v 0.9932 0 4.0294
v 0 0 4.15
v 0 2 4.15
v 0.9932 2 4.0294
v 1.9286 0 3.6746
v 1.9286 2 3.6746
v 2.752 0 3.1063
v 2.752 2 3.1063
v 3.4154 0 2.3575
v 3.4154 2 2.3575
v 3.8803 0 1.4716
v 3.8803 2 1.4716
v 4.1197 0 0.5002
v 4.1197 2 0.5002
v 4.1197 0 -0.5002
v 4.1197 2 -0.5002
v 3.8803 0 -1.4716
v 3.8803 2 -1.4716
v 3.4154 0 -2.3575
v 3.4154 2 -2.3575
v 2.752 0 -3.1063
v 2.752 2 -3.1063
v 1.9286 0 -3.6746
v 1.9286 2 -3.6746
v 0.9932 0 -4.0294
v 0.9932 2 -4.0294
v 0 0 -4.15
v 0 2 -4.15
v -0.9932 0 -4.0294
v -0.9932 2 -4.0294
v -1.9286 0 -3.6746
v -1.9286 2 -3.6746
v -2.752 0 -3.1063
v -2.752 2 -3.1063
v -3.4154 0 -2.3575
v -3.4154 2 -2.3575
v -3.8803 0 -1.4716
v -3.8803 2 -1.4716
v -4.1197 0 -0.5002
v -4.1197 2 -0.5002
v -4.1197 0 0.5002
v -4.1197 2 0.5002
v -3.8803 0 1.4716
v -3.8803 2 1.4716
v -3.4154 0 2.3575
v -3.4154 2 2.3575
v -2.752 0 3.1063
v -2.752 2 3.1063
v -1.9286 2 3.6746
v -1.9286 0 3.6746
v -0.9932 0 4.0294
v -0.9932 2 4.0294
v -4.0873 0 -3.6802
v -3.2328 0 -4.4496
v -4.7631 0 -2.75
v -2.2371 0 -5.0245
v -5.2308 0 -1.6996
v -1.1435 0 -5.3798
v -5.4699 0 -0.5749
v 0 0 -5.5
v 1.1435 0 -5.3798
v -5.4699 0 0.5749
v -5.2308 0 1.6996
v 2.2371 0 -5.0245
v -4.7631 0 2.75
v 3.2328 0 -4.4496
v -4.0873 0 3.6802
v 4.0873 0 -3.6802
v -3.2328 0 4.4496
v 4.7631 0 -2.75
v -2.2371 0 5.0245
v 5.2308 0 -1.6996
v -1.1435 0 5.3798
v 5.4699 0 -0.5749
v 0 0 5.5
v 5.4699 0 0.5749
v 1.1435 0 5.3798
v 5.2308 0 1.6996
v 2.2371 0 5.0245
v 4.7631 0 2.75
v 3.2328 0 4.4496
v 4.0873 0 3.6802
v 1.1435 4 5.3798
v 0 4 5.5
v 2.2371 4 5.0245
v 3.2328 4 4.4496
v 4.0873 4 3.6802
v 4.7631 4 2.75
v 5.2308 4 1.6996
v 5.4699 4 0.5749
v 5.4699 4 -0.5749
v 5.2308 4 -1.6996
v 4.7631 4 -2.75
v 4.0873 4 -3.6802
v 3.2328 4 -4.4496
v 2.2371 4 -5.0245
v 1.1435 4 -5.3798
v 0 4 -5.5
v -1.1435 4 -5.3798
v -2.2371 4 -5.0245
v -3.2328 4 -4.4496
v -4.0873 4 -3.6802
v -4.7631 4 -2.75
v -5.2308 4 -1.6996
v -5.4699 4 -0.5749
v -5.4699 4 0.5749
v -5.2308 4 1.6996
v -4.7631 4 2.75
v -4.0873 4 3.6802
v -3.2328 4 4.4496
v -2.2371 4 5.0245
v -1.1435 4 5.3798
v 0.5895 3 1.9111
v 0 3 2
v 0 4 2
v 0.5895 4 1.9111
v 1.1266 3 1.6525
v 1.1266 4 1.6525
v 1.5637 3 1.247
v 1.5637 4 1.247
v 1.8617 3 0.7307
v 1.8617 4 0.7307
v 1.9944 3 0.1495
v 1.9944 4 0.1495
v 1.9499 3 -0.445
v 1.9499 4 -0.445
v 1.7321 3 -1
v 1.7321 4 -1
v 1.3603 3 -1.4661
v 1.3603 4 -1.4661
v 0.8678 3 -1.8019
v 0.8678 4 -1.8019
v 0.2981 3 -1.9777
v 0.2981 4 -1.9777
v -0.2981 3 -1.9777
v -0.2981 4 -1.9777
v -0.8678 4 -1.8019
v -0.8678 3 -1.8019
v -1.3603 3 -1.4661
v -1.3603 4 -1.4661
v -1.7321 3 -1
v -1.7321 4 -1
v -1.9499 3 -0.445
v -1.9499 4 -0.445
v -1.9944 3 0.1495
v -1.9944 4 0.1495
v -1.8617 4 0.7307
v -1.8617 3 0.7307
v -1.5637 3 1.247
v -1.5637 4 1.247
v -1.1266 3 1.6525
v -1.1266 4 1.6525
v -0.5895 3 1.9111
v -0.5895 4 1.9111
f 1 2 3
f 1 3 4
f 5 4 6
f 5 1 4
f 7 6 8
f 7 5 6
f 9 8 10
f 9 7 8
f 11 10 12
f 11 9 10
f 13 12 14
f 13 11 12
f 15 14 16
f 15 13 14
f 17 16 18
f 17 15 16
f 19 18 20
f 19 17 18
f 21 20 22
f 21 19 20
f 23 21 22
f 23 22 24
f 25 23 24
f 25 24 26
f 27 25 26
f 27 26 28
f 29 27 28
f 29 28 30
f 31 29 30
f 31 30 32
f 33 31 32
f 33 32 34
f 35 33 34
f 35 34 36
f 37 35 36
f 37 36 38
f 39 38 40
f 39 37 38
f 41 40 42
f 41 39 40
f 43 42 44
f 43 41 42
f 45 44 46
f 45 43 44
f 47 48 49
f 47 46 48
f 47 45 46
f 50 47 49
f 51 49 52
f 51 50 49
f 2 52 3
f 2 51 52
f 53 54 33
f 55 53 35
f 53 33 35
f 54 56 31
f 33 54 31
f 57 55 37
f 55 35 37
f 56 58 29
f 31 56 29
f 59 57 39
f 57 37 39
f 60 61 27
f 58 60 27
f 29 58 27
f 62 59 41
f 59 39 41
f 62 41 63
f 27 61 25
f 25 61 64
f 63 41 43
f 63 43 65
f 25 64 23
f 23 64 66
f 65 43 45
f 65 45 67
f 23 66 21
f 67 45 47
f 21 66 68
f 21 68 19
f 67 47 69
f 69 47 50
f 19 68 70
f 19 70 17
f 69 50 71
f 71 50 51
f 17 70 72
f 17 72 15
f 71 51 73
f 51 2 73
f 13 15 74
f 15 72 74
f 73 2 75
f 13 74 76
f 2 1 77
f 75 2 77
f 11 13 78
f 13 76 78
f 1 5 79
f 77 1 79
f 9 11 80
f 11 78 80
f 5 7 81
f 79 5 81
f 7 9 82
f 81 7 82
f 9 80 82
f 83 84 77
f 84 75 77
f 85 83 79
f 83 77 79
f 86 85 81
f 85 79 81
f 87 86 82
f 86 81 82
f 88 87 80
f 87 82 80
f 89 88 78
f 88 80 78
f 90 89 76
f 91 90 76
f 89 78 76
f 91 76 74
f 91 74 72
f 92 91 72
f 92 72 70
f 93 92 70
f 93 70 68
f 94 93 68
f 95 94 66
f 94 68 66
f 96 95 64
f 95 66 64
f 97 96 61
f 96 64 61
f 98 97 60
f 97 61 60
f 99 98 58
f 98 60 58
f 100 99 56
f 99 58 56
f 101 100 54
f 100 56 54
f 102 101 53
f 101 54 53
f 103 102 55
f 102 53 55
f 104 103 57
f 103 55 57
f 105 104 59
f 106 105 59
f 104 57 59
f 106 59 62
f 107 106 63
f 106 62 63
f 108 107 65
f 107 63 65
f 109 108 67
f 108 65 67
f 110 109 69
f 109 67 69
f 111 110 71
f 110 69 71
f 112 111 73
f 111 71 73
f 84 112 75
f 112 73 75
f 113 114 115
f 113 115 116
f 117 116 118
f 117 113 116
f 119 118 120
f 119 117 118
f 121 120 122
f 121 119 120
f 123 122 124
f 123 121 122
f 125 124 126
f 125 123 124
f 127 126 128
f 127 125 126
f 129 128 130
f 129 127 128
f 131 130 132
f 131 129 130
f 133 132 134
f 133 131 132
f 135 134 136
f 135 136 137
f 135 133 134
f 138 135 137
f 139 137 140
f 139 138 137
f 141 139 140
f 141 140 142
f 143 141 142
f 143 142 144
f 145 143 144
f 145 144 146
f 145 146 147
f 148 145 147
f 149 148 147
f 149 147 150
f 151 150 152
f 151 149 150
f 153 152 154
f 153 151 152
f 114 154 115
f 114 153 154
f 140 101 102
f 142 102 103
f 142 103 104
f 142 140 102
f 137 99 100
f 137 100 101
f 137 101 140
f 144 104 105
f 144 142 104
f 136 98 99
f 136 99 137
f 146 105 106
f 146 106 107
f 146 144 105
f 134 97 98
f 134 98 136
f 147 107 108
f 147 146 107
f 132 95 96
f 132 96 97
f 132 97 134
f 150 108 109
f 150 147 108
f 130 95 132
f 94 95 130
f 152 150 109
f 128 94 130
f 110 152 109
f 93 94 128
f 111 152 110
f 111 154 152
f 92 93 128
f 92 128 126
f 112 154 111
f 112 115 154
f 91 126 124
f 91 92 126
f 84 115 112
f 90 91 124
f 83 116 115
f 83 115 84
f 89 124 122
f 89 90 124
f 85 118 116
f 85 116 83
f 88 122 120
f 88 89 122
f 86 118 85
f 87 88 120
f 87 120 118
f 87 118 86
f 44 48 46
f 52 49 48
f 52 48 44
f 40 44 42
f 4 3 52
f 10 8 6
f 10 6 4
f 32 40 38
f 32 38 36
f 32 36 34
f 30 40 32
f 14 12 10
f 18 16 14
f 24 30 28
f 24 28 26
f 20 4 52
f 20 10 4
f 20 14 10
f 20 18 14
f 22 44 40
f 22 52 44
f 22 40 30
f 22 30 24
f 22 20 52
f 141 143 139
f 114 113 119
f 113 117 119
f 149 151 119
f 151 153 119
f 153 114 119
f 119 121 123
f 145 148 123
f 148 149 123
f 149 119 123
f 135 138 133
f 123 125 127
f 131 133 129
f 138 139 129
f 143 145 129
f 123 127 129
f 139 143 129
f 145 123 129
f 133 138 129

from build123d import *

# Parameters (mm, degrees)
SKETCH1_R           = 5.5
SKETCH1_R_2         = 4.15
BOSS_EXTRUDE1_DEPTH = 3
SKETCH2_R           = 5.5
SKETCH2_R_2         = 2
BOSS_EXTRUDE2_DEPTH = 1
BOSS_EXTRUDE3_START = 1
SKETCH3_R           = 4.15
BOSS_EXTRUDE3_DEPTH = 1


with BuildPart() as part:
    # Sketch1 → Boss-Extrude1 (new body)
    with BuildSketch(Plane(origin=(0, 0, 0), x_dir=(1, 0, 0), z_dir=(0, 1, 0))):
        with Locations(Location((0, 0, 0), (0, 0, 270))):
            Circle(SKETCH1_R)
        with Locations(Location((0, 0, 0), (0, 0, 270))):
            Circle(SKETCH1_R_2, mode=Mode.SUBTRACT)
    extrude(amount=BOSS_EXTRUDE1_DEPTH)

    # Sketch2 → Boss-Extrude2 (add)
    with BuildSketch(Plane(origin=(0, 3, 0), x_dir=(1, 0, 0), z_dir=(0, 1, 0))):
        with Locations(Location((0, 0, 0), (0, 0, 270))):
            Circle(SKETCH2_R)
        with Locations(Location((0, 0, 0), (0, 0, 270))):
            Circle(SKETCH2_R_2, mode=Mode.SUBTRACT)
    extrude(amount=BOSS_EXTRUDE2_DEPTH)

    # Sketch3 → Boss-Extrude3 (add)
    with BuildSketch(Plane.XZ.offset(-3).offset(BOSS_EXTRUDE3_START)):
        with Locations(Location((0, 0, 0), (0, 0, 270))):
            Circle(SKETCH3_R)
    extrude(amount=-BOSS_EXTRUDE3_DEPTH)


solid = part.part
